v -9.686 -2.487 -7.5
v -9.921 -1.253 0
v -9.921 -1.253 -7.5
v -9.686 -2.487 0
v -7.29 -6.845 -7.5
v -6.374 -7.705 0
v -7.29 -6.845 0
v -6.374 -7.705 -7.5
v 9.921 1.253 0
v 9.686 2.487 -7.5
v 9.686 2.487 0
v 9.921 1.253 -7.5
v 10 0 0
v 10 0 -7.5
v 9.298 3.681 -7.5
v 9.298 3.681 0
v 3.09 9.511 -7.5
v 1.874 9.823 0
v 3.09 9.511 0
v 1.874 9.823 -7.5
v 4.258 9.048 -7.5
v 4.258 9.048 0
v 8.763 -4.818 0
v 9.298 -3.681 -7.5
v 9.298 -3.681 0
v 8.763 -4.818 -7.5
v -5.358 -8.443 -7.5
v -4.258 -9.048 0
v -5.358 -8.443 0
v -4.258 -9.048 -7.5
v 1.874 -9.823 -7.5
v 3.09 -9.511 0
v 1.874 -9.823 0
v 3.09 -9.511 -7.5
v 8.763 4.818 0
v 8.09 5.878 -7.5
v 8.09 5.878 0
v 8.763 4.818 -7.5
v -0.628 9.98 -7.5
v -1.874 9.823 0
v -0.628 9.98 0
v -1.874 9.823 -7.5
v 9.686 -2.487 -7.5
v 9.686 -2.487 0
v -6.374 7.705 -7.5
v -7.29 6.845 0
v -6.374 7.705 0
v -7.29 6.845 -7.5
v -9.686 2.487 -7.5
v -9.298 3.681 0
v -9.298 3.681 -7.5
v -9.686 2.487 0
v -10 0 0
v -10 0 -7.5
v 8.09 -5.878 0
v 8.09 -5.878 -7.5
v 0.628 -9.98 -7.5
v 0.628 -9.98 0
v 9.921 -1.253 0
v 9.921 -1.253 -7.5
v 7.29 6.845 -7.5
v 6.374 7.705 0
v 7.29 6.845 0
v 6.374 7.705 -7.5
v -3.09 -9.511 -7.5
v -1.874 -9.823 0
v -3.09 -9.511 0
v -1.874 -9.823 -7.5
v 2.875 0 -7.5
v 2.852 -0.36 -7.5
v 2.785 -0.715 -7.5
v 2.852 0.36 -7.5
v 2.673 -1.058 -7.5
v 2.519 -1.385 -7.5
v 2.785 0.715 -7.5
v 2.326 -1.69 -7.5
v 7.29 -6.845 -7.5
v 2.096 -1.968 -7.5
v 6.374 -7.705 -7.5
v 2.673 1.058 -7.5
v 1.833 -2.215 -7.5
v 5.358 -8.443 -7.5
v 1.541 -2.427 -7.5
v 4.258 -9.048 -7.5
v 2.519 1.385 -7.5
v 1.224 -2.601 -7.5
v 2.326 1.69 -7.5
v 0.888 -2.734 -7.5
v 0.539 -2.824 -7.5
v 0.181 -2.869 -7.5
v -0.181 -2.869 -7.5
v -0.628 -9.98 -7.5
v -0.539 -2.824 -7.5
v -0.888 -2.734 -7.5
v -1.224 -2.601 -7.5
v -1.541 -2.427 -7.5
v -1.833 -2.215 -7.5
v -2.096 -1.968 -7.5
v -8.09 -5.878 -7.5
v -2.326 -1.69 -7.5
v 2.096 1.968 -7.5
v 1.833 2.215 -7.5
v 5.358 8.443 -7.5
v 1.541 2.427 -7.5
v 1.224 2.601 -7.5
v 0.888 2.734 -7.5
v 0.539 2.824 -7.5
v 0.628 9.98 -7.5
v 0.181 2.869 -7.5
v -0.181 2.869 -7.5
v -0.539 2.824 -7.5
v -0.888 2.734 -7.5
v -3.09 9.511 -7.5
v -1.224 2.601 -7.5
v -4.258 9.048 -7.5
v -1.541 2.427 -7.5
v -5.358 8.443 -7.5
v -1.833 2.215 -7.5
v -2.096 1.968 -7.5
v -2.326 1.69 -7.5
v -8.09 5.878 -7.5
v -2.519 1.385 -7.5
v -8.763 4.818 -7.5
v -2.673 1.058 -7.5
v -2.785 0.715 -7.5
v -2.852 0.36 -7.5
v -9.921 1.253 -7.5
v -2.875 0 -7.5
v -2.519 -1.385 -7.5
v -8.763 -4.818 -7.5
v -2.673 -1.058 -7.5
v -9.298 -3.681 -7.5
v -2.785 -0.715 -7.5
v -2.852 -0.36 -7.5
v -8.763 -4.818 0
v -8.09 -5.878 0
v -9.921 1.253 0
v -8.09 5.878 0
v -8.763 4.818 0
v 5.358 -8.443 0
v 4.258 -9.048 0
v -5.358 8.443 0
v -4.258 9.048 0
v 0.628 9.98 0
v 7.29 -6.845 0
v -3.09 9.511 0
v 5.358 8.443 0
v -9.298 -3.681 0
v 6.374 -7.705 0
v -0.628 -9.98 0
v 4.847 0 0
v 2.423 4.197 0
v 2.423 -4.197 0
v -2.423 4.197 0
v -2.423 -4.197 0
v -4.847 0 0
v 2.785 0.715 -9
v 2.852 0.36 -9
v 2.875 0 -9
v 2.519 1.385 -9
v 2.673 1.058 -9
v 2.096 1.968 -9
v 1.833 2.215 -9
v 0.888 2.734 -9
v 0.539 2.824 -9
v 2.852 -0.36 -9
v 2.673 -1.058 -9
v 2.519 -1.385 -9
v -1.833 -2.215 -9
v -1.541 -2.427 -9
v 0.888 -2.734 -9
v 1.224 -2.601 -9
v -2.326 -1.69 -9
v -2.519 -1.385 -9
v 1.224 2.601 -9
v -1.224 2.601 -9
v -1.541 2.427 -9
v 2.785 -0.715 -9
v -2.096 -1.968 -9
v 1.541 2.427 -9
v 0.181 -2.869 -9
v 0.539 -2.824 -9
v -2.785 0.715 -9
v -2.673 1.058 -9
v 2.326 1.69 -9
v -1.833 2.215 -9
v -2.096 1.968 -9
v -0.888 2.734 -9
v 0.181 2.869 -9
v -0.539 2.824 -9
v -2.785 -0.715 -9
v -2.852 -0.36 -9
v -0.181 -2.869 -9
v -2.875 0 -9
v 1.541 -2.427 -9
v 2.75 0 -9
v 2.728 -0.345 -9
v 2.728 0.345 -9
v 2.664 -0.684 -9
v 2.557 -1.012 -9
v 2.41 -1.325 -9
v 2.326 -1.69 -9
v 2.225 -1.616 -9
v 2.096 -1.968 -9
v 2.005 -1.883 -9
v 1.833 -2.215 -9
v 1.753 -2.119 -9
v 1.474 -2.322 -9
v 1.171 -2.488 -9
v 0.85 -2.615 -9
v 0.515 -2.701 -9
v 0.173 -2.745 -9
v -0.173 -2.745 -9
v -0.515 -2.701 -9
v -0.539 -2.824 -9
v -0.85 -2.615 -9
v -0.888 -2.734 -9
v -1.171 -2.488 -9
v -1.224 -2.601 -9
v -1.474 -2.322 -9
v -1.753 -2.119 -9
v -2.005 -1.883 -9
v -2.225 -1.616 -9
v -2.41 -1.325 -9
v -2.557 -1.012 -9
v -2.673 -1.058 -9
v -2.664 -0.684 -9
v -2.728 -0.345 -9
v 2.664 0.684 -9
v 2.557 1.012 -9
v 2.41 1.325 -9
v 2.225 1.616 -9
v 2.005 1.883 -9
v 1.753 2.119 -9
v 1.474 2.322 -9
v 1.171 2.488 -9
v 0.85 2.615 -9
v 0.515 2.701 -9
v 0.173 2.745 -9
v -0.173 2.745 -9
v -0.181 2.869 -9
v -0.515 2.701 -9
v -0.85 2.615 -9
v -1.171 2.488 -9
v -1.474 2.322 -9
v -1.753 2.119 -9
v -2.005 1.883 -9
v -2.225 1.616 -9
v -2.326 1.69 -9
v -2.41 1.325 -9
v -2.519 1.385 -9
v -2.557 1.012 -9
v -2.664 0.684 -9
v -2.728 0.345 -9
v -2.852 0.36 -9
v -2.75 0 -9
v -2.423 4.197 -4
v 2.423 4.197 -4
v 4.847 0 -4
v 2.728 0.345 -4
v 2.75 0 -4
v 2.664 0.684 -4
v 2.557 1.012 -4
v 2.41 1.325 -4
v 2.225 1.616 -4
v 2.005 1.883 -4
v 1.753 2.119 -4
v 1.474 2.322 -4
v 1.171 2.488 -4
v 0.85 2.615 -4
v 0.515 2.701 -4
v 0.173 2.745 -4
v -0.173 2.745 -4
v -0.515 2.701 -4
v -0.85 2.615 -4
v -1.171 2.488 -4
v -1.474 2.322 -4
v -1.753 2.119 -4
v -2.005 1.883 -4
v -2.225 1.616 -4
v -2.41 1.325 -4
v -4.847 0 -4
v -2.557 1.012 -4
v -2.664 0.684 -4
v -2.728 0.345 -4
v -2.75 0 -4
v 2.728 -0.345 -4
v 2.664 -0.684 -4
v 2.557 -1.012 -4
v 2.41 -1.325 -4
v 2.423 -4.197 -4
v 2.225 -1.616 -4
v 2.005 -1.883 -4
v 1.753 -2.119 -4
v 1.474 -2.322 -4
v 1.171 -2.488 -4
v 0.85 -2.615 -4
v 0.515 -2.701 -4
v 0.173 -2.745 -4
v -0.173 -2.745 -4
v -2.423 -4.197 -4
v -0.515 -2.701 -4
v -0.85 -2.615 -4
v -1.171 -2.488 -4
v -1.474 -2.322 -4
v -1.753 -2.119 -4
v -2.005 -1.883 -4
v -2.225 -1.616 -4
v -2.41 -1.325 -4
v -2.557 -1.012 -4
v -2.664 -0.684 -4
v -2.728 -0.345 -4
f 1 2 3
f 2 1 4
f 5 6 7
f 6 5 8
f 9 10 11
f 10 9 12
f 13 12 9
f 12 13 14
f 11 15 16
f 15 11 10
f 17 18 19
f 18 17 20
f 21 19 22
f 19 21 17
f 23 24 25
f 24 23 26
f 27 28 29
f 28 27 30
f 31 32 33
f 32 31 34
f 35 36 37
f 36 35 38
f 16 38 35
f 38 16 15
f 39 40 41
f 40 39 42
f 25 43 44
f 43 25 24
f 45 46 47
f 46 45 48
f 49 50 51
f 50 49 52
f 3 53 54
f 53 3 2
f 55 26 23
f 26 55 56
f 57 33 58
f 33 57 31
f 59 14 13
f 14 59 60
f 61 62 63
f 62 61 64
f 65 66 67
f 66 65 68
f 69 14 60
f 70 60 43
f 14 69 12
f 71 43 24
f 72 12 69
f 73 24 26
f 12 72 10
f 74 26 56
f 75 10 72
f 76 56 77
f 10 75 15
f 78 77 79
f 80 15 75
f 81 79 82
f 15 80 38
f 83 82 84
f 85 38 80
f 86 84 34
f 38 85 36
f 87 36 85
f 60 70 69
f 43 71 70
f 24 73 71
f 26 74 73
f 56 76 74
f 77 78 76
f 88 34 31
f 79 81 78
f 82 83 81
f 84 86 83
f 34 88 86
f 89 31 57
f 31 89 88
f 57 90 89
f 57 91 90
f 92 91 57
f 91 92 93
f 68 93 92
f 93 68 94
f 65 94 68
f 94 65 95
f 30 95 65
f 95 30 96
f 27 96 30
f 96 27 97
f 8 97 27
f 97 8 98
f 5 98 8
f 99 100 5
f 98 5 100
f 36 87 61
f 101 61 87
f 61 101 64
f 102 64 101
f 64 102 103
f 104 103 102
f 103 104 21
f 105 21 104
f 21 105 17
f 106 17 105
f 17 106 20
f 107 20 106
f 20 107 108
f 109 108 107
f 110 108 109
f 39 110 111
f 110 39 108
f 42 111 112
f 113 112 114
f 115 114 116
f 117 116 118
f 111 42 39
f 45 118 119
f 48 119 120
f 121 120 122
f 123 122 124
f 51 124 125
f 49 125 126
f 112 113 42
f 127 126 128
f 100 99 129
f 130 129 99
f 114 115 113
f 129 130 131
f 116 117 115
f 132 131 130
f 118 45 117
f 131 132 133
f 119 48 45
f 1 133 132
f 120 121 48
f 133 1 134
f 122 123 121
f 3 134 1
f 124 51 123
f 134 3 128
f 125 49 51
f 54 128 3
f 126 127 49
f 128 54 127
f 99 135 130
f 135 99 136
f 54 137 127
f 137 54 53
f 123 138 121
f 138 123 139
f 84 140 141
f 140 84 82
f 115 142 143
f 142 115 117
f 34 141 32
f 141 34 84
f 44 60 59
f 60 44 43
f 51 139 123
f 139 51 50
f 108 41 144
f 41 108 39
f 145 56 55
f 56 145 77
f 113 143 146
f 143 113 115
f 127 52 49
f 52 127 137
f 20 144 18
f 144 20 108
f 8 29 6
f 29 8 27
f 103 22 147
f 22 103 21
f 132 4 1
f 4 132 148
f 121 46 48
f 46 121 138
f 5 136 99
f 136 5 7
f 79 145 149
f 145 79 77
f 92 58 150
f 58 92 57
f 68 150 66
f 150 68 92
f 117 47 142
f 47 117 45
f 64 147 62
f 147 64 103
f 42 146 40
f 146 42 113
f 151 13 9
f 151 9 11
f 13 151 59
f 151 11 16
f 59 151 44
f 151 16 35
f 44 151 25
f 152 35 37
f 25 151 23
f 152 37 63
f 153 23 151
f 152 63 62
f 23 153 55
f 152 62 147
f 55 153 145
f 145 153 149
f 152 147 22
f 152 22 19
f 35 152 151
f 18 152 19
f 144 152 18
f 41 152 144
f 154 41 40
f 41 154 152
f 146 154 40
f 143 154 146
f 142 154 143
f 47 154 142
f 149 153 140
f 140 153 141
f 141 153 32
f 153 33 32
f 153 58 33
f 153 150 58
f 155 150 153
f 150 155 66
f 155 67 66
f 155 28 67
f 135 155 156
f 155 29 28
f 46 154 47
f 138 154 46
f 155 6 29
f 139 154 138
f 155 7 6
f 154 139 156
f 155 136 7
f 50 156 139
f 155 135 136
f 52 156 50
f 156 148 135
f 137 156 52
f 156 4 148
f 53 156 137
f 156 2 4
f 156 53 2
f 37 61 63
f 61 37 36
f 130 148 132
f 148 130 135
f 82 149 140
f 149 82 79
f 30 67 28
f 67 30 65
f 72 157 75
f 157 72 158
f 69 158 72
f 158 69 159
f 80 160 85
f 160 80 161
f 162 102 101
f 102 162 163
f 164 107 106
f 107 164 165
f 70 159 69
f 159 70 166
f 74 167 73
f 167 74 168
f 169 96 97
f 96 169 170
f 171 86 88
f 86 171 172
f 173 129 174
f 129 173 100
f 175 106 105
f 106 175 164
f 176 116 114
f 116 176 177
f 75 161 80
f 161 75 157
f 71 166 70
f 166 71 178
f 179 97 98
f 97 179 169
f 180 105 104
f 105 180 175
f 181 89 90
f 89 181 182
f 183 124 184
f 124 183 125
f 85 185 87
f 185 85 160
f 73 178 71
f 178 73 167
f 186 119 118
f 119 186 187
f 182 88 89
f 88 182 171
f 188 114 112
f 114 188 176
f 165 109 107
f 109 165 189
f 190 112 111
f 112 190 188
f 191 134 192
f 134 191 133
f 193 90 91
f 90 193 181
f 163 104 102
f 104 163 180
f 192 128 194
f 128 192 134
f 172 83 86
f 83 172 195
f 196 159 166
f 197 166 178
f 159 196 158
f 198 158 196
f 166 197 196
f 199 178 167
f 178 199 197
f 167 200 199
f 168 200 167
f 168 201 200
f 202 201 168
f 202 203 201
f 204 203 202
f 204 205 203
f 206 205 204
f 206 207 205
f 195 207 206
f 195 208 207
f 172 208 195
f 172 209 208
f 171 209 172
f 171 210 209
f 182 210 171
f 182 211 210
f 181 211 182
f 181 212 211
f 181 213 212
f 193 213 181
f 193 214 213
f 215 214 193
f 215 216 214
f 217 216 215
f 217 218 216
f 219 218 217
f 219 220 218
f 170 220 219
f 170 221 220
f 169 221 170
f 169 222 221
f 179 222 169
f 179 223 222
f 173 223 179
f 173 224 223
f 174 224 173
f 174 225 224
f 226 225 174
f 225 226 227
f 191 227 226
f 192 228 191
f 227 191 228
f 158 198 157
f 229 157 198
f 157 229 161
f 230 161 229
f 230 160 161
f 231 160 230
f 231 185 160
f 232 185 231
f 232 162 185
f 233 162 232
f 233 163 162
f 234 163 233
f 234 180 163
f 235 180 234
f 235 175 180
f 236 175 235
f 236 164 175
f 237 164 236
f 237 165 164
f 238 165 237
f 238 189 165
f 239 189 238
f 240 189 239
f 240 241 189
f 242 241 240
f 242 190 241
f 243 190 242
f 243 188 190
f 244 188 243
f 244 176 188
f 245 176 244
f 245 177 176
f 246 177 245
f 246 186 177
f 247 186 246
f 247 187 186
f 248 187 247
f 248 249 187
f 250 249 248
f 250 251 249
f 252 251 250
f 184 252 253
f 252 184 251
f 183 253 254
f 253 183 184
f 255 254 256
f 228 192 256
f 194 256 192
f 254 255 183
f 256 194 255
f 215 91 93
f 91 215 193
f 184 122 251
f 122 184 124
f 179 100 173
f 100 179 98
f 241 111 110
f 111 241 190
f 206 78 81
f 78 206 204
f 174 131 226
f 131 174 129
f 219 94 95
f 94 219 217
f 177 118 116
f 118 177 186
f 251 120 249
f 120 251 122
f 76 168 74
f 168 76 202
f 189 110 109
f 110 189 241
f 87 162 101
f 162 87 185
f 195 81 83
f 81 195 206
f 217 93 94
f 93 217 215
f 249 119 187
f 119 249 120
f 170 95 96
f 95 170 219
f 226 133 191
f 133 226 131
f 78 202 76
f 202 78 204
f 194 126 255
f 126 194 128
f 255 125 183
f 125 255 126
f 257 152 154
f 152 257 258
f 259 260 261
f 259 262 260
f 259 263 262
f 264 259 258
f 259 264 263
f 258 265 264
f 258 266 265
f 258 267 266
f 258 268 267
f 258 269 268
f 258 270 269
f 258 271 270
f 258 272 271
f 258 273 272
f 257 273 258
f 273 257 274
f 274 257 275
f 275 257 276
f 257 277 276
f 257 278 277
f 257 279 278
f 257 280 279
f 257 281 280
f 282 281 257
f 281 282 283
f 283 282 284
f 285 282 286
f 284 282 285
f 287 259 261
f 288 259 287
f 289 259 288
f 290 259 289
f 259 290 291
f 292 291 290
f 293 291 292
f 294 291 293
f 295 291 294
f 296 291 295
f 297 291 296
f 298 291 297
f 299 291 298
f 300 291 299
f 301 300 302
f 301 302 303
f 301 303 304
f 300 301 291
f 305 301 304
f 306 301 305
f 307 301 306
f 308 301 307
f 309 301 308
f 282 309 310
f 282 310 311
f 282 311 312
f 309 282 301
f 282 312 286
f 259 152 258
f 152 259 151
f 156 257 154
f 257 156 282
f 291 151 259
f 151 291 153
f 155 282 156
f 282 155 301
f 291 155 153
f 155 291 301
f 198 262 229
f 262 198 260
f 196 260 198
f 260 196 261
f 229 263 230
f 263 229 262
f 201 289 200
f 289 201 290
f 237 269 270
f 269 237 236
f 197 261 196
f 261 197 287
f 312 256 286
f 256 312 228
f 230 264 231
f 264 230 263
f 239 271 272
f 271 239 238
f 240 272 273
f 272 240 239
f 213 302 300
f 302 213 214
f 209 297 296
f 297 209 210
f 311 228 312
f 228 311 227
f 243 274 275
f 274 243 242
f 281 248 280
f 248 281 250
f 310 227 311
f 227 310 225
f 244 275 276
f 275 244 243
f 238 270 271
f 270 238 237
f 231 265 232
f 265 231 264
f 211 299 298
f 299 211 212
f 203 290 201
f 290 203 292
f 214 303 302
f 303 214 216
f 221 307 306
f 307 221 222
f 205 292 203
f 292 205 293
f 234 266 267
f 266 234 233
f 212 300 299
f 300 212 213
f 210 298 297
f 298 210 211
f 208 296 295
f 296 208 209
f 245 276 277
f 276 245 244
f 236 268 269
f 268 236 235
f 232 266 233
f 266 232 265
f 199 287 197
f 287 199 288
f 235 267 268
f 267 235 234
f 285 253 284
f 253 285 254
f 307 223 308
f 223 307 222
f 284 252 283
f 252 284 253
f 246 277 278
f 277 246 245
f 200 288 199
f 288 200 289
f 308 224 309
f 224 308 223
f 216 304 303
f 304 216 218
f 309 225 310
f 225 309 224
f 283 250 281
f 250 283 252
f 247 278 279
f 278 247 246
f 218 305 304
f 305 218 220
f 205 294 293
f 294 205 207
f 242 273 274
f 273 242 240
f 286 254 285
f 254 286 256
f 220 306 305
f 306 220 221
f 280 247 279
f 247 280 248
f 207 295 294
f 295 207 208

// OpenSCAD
$fn = 50;

difference() {
	union() {
		translate(v = [0, 0, -7.5]) {
			cylinder(h = 7.5, r = 10.0);
		}
		#translate(v = [0, 0, -9.0]) {
			cylinder(h = 9, r = 2.875);
		}
	}
	union() {
		translate(v = [0, 0, 0]) {
			rotate(a = [0, 0, 0]) {
				difference() {
					union() {
						translate(v = [0, 0, -4]) {
							linear_extrude(height = 4) {
								polygon(points = [[4.8468, 0.0], [2.4234000000000004, 4.197451927062417], [-2.423399999999999, 4.197451927062417], [-4.8468, 5.935618106107392e-16], [-2.423400000000002, -4.197451927062416], [2.423399999999997, -4.197451927062419]]);
							}
						}
					}
					union();
				}
			}
		}
		#translate(v = [0, 0, -100.0]) {
			cylinder(h = 200, r = 2.75);
		}
	}
}
